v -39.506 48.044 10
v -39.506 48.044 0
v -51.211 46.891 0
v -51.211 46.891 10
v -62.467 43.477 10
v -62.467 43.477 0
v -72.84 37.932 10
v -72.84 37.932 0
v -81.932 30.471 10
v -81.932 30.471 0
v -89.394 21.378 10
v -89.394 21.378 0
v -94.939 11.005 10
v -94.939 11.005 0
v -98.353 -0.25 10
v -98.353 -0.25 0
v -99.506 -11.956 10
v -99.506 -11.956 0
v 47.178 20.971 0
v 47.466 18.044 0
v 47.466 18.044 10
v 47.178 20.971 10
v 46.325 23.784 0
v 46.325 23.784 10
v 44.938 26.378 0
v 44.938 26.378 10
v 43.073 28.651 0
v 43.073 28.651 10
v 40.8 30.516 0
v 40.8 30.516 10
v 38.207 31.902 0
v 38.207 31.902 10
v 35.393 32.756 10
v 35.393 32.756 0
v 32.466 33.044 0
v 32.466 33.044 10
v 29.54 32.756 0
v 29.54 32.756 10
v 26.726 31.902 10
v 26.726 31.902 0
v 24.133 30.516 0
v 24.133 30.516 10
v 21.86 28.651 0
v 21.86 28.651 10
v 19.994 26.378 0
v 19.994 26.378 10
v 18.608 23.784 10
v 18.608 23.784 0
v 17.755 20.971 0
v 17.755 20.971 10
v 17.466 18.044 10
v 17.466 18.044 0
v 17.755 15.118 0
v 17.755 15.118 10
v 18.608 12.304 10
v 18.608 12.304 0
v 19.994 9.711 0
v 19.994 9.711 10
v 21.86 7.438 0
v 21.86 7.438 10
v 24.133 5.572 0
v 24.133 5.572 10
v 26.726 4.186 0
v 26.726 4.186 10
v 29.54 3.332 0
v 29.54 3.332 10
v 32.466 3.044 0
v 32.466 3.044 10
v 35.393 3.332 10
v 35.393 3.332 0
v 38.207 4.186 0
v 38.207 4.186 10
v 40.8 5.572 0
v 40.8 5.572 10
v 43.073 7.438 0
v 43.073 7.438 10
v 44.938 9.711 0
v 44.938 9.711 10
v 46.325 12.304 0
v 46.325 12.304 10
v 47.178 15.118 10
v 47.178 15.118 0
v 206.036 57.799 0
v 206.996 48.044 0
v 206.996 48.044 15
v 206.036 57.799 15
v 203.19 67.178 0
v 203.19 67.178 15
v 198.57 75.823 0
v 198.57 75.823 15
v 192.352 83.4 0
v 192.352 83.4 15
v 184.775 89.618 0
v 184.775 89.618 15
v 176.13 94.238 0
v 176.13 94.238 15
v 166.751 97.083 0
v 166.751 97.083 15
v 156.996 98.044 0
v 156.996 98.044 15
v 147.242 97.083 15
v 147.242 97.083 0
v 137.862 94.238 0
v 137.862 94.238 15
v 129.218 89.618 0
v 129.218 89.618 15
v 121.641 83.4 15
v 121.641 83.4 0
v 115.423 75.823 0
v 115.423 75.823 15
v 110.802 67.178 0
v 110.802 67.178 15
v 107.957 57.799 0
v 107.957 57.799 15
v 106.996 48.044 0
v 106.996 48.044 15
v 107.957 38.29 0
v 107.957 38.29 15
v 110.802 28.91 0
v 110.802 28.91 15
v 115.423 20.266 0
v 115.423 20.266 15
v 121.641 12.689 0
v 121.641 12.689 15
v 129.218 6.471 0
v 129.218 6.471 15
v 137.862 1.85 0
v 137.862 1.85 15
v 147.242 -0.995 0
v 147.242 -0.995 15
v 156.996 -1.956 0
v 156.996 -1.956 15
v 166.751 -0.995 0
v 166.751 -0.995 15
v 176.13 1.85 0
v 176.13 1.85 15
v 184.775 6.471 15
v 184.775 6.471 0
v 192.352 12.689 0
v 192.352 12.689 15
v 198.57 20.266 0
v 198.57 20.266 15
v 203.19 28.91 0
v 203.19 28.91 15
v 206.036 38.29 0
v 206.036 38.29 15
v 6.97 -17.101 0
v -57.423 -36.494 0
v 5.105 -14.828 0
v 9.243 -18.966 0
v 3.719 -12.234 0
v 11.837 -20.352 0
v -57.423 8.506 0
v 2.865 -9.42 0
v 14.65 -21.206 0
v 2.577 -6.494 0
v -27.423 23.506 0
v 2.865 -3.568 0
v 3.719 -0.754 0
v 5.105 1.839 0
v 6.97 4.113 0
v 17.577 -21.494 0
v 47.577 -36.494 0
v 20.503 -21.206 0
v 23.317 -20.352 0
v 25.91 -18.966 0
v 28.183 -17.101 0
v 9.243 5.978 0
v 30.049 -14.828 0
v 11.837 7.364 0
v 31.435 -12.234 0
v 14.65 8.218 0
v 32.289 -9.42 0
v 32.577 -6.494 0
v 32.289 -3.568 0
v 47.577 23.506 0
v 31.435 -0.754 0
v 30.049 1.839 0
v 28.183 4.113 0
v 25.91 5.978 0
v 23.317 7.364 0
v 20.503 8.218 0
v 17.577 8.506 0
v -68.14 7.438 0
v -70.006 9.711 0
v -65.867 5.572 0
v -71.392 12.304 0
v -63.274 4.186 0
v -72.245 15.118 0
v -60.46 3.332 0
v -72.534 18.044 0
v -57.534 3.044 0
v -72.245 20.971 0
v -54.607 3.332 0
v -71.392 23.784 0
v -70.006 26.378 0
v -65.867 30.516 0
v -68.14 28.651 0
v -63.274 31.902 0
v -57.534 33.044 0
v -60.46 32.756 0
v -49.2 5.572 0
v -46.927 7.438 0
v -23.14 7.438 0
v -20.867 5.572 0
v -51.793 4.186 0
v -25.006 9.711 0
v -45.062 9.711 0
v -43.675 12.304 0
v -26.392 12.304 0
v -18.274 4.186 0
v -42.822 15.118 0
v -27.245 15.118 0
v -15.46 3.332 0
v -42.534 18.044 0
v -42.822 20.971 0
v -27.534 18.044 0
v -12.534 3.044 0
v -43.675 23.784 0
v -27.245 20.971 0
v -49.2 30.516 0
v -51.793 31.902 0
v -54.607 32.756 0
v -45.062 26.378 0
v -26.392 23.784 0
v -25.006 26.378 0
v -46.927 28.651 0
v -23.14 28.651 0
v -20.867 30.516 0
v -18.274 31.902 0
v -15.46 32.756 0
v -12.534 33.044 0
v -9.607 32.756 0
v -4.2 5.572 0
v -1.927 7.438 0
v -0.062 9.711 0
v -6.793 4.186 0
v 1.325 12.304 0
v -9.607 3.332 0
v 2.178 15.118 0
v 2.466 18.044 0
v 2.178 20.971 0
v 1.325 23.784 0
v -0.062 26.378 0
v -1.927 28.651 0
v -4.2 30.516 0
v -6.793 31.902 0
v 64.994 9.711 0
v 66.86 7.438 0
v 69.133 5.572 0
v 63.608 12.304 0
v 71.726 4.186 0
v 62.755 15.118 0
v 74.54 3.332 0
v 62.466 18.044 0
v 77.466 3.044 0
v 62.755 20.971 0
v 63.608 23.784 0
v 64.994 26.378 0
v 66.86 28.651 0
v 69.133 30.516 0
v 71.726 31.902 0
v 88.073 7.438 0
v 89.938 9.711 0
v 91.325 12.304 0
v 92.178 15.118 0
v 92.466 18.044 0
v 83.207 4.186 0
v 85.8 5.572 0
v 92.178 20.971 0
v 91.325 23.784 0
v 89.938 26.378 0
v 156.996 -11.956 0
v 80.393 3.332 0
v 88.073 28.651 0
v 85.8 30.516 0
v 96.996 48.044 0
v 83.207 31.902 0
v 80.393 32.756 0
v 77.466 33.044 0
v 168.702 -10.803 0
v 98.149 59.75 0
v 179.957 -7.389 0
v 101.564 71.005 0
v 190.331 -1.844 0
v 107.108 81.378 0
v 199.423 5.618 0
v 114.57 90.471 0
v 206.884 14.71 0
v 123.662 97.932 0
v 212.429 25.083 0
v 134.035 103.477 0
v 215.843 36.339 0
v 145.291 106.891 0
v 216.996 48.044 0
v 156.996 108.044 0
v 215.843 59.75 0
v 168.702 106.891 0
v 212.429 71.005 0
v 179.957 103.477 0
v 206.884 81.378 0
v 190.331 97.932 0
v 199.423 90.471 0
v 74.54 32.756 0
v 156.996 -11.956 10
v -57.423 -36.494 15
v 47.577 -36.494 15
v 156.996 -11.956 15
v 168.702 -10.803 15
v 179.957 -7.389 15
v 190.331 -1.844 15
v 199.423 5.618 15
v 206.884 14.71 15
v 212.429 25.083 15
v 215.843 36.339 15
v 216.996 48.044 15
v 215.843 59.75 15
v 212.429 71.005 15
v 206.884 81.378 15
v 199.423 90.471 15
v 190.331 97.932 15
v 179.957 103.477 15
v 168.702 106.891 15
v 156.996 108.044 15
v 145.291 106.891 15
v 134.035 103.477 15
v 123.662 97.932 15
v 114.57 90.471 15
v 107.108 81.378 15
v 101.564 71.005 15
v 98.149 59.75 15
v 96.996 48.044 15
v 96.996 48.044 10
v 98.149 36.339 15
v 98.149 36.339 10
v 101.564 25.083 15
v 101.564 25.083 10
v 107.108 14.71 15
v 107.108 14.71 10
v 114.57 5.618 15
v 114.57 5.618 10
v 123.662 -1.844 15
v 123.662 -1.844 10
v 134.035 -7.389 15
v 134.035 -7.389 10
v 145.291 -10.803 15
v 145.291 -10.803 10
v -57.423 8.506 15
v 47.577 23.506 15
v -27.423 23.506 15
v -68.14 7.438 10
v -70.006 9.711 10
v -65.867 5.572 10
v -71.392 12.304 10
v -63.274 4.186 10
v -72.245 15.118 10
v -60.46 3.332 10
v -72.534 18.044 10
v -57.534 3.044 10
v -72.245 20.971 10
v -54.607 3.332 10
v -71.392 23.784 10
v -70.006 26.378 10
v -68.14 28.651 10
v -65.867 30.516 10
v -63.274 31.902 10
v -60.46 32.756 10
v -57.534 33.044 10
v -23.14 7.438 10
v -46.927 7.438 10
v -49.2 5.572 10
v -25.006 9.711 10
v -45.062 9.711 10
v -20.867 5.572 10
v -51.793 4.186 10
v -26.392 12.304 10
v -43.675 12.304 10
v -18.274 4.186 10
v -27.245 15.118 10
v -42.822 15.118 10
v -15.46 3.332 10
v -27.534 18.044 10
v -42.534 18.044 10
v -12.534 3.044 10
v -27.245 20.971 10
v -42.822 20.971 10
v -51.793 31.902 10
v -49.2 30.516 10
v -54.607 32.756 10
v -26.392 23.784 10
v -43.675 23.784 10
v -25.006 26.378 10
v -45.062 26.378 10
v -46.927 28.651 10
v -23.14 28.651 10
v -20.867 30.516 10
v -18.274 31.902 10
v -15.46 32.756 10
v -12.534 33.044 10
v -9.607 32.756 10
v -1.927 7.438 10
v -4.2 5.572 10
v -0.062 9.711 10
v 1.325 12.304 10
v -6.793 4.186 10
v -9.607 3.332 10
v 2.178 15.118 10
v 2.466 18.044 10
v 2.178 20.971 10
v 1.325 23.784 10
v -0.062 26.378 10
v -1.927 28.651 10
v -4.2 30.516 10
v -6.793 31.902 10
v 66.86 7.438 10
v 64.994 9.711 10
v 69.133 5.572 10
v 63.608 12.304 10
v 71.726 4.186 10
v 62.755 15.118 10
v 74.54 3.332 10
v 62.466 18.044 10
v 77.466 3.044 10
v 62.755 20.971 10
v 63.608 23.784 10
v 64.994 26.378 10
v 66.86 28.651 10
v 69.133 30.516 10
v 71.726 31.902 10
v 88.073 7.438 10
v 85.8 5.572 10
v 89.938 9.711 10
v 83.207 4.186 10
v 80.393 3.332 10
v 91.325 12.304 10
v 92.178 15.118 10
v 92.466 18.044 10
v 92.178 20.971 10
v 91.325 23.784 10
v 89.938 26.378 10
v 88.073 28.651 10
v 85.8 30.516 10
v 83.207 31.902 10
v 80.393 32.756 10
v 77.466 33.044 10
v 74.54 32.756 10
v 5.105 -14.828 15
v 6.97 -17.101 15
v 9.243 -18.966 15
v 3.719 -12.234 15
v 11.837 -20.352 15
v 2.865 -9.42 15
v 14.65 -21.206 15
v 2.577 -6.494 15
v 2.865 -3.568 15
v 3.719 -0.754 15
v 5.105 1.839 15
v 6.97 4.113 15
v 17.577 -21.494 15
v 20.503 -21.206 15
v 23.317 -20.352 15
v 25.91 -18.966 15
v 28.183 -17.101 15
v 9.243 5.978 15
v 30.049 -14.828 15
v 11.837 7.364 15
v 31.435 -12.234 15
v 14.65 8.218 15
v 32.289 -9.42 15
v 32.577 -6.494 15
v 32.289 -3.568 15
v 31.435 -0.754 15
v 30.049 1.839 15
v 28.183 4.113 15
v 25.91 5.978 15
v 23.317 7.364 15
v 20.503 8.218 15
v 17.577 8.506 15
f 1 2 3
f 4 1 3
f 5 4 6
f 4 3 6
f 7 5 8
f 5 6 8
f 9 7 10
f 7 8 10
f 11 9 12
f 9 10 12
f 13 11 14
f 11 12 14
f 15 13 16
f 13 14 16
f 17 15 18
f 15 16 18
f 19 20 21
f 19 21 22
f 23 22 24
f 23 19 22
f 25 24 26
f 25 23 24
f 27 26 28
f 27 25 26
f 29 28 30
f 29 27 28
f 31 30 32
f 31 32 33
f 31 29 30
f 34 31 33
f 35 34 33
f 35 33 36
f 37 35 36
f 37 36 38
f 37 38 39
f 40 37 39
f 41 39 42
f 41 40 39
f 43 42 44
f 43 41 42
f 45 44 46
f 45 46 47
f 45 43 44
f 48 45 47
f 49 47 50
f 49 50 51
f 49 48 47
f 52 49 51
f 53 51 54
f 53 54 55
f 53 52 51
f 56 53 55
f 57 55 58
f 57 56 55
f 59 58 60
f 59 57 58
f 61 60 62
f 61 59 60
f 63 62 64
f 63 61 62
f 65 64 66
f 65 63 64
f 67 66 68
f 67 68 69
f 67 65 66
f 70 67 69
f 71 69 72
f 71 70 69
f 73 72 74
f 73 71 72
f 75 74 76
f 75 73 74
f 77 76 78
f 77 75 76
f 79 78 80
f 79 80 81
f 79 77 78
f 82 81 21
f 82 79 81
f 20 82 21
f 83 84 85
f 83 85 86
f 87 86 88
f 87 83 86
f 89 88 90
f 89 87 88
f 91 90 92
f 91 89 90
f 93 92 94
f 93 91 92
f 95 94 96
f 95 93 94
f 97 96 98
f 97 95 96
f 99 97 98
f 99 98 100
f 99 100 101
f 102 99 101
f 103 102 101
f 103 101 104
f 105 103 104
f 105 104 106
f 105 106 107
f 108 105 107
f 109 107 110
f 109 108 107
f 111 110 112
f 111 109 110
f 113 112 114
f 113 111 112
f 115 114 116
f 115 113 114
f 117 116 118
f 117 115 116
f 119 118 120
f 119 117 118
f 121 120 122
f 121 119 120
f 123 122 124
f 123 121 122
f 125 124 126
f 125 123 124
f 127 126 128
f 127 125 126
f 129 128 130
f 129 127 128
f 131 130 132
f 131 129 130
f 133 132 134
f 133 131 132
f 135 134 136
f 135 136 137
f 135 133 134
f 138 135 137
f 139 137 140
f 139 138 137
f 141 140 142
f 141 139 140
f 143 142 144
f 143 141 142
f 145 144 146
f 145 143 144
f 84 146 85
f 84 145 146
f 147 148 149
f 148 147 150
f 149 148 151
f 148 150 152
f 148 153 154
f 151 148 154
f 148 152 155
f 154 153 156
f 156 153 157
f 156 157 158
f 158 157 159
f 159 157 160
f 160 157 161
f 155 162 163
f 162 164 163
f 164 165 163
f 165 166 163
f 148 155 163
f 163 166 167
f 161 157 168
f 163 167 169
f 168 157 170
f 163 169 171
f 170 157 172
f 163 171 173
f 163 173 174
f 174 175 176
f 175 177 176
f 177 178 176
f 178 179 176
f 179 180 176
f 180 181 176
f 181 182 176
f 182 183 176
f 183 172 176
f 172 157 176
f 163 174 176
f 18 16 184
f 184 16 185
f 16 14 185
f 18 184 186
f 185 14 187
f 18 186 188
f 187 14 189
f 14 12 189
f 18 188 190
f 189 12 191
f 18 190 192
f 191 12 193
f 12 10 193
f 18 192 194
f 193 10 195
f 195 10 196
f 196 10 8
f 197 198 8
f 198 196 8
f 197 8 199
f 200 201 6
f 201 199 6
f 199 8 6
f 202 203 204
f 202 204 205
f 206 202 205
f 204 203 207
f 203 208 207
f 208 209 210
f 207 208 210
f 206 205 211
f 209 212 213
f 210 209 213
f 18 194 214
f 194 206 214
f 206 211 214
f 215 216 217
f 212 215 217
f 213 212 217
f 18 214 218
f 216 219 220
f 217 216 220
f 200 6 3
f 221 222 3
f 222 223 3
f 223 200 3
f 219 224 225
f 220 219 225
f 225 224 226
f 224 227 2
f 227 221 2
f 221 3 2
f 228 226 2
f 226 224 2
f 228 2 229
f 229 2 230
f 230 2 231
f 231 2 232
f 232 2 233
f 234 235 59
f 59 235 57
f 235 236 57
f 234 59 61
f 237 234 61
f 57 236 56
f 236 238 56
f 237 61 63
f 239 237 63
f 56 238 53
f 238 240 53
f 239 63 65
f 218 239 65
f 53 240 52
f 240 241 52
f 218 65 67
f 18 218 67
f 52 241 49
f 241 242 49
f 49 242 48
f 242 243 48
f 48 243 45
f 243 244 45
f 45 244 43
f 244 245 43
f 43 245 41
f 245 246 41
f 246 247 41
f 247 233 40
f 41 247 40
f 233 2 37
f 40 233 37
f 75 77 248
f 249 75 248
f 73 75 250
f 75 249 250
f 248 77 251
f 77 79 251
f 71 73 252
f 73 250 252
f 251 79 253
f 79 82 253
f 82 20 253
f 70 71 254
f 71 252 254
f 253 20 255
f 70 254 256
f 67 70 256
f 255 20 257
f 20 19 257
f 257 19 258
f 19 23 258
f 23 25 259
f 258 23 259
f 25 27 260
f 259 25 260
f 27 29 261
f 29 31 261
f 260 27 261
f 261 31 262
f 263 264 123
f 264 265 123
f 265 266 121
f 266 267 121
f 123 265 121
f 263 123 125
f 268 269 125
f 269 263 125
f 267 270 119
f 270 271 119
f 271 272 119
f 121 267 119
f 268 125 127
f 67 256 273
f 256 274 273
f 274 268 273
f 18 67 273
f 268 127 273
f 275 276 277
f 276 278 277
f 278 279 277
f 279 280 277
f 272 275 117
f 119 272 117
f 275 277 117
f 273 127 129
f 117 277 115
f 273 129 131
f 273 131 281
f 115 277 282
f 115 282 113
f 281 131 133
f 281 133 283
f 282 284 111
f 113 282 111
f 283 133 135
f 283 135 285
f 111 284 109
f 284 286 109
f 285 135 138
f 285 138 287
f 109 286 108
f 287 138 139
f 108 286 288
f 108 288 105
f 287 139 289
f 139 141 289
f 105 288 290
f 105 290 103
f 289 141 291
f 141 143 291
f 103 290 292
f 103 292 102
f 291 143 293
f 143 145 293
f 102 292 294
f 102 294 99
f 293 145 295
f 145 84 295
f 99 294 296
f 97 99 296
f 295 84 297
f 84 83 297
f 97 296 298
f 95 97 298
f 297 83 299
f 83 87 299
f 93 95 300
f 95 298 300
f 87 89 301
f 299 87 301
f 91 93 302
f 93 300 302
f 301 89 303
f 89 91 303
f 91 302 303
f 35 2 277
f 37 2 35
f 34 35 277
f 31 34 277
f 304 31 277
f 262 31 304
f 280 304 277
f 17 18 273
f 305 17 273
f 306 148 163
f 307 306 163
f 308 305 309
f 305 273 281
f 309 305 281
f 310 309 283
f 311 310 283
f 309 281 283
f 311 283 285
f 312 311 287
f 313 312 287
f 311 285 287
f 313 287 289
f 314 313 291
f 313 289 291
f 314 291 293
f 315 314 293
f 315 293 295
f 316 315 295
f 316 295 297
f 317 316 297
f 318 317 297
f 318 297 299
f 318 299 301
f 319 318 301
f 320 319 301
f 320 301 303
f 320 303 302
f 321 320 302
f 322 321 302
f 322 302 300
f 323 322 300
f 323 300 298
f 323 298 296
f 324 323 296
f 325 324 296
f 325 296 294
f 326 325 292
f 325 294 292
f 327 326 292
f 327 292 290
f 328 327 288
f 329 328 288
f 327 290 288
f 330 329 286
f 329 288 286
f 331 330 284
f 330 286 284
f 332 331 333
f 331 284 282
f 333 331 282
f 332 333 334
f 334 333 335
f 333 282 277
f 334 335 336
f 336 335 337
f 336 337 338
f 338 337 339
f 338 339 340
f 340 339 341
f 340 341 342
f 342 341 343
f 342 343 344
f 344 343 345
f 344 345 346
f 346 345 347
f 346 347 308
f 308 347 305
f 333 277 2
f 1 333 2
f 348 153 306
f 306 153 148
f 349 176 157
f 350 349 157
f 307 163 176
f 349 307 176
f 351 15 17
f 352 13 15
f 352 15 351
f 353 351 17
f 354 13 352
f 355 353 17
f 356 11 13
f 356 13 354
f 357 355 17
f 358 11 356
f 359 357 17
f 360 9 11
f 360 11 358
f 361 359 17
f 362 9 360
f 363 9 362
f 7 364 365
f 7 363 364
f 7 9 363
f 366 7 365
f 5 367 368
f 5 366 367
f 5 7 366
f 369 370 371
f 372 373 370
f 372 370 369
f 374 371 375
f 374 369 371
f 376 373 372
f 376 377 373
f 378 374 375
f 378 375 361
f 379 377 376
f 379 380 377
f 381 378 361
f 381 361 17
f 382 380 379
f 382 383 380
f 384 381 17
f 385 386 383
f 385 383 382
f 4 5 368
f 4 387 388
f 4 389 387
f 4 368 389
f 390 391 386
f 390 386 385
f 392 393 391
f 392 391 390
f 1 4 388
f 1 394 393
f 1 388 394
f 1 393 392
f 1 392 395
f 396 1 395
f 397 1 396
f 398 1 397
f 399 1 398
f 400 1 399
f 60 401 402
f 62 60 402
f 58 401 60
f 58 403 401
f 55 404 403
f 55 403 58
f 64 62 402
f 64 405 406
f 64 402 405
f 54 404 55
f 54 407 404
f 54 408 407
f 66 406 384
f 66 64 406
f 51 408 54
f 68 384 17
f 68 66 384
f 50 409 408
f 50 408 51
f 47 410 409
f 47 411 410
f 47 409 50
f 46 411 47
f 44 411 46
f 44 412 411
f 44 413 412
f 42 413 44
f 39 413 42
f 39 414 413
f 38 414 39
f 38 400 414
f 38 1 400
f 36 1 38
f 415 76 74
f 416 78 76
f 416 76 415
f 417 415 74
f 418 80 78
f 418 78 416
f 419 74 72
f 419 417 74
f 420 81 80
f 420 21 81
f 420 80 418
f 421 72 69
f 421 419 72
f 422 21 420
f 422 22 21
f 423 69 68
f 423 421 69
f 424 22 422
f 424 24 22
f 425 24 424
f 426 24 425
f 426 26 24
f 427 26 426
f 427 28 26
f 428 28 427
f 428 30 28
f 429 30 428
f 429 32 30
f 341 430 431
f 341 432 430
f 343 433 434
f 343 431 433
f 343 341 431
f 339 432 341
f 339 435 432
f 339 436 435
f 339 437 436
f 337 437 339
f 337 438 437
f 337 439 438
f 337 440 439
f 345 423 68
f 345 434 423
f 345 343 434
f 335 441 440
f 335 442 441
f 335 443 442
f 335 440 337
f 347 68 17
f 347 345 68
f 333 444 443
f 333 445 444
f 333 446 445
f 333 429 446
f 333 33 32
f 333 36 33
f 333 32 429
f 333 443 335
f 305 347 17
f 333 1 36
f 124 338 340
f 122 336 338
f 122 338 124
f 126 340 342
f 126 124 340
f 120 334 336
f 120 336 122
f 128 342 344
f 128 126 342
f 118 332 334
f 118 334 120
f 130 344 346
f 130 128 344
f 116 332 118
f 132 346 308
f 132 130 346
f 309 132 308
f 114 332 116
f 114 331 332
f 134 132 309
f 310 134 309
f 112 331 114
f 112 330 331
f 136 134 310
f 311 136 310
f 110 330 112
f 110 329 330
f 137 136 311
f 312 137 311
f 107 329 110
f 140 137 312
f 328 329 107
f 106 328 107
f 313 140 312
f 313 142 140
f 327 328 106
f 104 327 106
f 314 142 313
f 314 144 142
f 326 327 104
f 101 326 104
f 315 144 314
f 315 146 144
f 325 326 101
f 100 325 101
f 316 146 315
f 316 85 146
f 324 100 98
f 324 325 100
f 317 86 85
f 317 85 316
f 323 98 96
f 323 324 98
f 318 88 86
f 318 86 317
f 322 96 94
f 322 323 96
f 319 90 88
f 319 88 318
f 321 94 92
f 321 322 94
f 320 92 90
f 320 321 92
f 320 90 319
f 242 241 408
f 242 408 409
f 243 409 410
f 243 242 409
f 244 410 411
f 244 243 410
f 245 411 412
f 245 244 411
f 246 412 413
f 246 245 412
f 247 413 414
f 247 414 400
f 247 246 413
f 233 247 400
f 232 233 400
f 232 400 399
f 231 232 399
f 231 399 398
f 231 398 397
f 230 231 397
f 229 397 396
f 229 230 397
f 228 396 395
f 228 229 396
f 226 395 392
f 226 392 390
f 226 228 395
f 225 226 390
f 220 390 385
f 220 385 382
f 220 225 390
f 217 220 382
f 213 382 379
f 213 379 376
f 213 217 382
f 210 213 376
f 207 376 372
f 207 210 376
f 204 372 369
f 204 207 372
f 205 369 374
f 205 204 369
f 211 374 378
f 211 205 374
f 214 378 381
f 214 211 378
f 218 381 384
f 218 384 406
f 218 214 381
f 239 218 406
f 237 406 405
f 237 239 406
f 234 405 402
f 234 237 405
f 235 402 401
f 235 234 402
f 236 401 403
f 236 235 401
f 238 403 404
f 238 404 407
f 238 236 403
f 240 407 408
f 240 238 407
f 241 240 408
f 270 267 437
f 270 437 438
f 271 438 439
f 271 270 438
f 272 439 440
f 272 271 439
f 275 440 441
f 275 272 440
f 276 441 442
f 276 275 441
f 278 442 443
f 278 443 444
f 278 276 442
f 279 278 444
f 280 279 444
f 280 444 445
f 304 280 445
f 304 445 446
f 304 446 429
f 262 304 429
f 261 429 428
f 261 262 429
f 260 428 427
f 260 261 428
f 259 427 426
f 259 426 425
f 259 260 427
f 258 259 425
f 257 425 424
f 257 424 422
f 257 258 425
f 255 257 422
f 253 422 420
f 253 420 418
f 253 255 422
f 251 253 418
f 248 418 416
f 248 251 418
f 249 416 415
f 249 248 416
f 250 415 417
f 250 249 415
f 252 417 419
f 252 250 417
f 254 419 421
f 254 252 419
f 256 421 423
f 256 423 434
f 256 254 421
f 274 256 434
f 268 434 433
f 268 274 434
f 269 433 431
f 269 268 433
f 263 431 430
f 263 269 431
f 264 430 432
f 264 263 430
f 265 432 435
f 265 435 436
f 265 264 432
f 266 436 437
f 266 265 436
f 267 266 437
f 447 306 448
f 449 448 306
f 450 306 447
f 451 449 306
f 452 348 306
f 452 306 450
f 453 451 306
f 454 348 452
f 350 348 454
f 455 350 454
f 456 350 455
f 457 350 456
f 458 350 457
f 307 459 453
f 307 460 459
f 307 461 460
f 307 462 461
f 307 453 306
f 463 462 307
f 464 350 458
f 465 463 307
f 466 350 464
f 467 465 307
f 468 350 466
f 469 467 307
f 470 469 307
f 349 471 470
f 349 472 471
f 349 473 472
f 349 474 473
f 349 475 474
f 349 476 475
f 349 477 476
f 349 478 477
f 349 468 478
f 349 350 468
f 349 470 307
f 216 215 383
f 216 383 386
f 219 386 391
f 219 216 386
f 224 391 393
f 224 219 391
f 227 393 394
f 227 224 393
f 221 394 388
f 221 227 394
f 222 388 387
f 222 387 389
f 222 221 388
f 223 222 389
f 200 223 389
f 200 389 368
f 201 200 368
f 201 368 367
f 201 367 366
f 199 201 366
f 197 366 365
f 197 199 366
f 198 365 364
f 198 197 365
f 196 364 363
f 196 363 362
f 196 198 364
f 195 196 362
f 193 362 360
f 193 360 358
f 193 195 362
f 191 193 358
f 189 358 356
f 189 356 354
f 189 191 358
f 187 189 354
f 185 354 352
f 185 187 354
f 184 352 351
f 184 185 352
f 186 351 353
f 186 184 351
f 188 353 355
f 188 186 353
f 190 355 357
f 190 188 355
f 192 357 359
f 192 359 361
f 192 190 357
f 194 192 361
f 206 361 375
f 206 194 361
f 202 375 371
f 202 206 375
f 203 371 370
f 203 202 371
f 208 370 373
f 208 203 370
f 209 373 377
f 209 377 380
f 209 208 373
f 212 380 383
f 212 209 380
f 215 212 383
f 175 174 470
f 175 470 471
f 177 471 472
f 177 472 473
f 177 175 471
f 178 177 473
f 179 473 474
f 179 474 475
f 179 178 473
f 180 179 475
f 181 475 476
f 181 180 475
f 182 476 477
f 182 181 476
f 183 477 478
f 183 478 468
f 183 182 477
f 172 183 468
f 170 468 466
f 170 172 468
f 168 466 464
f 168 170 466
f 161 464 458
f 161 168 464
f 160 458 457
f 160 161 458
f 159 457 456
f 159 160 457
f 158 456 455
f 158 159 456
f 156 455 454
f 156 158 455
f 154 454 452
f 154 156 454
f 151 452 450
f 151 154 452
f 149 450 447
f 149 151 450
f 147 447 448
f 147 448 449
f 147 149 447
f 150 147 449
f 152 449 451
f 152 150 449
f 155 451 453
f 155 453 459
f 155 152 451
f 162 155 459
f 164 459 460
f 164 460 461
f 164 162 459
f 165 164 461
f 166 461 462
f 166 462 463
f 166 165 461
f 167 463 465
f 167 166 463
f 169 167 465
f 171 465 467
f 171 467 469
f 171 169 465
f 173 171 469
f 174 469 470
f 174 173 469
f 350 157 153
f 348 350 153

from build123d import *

# Parameters (mm, degrees)
F1_R     = 50
F2_DEPTH = 15
F1_R_2   = 15
F3_DEPTH = 10
F4_R     = 15
F5_DEPTH = 15


with BuildPart() as f2:
    # F1 (on Top) → F2 (new body)
    with BuildSketch(Plane.XY):
        with BuildLine():
            ThreePointArc((216.9962952295, 48.0441849954), (156.9962952295, 108.0441849954), (96.9962952295, 48.0441849954))
            ThreePointArc((96.9962952295, 48.0441849954), (114.5698883583, 5.6177781242), (156.9962952295, -11.9558150046))
            ThreePointArc((156.9962952295, -11.9558150046), (199.4227021007, 5.6177781242), (216.9962952295, 48.0441849954))
        make_face()
        with Locations((156.9962952295, 48.0441849954)):
            Circle(F1_R, mode=Mode.SUBTRACT)
    extrude(amount=F2_DEPTH)

    # F1 (on Top) → F3 (join)
    with BuildSketch(Plane.XY):
        with BuildLine():
            ThreePointArc((156.9962952295, -11.9558150046), (114.5698883583, 5.6177781242), (96.9962952295, 48.0441849954))
            Line((96.9962952295, 48.0441849954), (-39.5058169961, 48.0441849954))
            ThreePointArc((-39.5058169961, 48.0441849954), (-81.9322238673, 30.4705918666), (-99.5058169961, -11.9558150046))
            Line((-99.5058169961, -11.9558150046), (-39.5058169961, -11.9558150046))
            Line((-39.5058169961, -11.9558150046), (156.9962952295, -11.9558150046))
        make_face()
        with Locations((-57.5335733734, 18.0441849954)):
            Circle(F1_R_2, mode=Mode.SUBTRACT)
        with Locations((-12.5335733734, 18.0441849954)):
            Circle(F1_R_2, mode=Mode.SUBTRACT)
        with Locations((32.4664266266, 18.0441849954)):
            Circle(F1_R_2, mode=Mode.SUBTRACT)
        with Locations((77.4664266266, 18.0441849954)):
            Circle(F1_R_2, mode=Mode.SUBTRACT)
    extrude(amount=F3_DEPTH)


with BuildPart() as f5:
    # F4 (on Top) → F5 (new body)
    with BuildSketch(Plane.XY):
        Polygon((47.5767727465, 23.5059403683), (-27.4232272535, 23.5059403683), (-57.4232272535, 8.5059403683), (-57.4232272535, -36.4940596317), (47.5767727465, -36.4940596317), align=None)
        with Locations((17.5767727465, -6.4940596317)):
            Circle(F4_R, mode=Mode.SUBTRACT)
    extrude(amount=F5_DEPTH)


solid = Compound([f2.part, f5.part])
